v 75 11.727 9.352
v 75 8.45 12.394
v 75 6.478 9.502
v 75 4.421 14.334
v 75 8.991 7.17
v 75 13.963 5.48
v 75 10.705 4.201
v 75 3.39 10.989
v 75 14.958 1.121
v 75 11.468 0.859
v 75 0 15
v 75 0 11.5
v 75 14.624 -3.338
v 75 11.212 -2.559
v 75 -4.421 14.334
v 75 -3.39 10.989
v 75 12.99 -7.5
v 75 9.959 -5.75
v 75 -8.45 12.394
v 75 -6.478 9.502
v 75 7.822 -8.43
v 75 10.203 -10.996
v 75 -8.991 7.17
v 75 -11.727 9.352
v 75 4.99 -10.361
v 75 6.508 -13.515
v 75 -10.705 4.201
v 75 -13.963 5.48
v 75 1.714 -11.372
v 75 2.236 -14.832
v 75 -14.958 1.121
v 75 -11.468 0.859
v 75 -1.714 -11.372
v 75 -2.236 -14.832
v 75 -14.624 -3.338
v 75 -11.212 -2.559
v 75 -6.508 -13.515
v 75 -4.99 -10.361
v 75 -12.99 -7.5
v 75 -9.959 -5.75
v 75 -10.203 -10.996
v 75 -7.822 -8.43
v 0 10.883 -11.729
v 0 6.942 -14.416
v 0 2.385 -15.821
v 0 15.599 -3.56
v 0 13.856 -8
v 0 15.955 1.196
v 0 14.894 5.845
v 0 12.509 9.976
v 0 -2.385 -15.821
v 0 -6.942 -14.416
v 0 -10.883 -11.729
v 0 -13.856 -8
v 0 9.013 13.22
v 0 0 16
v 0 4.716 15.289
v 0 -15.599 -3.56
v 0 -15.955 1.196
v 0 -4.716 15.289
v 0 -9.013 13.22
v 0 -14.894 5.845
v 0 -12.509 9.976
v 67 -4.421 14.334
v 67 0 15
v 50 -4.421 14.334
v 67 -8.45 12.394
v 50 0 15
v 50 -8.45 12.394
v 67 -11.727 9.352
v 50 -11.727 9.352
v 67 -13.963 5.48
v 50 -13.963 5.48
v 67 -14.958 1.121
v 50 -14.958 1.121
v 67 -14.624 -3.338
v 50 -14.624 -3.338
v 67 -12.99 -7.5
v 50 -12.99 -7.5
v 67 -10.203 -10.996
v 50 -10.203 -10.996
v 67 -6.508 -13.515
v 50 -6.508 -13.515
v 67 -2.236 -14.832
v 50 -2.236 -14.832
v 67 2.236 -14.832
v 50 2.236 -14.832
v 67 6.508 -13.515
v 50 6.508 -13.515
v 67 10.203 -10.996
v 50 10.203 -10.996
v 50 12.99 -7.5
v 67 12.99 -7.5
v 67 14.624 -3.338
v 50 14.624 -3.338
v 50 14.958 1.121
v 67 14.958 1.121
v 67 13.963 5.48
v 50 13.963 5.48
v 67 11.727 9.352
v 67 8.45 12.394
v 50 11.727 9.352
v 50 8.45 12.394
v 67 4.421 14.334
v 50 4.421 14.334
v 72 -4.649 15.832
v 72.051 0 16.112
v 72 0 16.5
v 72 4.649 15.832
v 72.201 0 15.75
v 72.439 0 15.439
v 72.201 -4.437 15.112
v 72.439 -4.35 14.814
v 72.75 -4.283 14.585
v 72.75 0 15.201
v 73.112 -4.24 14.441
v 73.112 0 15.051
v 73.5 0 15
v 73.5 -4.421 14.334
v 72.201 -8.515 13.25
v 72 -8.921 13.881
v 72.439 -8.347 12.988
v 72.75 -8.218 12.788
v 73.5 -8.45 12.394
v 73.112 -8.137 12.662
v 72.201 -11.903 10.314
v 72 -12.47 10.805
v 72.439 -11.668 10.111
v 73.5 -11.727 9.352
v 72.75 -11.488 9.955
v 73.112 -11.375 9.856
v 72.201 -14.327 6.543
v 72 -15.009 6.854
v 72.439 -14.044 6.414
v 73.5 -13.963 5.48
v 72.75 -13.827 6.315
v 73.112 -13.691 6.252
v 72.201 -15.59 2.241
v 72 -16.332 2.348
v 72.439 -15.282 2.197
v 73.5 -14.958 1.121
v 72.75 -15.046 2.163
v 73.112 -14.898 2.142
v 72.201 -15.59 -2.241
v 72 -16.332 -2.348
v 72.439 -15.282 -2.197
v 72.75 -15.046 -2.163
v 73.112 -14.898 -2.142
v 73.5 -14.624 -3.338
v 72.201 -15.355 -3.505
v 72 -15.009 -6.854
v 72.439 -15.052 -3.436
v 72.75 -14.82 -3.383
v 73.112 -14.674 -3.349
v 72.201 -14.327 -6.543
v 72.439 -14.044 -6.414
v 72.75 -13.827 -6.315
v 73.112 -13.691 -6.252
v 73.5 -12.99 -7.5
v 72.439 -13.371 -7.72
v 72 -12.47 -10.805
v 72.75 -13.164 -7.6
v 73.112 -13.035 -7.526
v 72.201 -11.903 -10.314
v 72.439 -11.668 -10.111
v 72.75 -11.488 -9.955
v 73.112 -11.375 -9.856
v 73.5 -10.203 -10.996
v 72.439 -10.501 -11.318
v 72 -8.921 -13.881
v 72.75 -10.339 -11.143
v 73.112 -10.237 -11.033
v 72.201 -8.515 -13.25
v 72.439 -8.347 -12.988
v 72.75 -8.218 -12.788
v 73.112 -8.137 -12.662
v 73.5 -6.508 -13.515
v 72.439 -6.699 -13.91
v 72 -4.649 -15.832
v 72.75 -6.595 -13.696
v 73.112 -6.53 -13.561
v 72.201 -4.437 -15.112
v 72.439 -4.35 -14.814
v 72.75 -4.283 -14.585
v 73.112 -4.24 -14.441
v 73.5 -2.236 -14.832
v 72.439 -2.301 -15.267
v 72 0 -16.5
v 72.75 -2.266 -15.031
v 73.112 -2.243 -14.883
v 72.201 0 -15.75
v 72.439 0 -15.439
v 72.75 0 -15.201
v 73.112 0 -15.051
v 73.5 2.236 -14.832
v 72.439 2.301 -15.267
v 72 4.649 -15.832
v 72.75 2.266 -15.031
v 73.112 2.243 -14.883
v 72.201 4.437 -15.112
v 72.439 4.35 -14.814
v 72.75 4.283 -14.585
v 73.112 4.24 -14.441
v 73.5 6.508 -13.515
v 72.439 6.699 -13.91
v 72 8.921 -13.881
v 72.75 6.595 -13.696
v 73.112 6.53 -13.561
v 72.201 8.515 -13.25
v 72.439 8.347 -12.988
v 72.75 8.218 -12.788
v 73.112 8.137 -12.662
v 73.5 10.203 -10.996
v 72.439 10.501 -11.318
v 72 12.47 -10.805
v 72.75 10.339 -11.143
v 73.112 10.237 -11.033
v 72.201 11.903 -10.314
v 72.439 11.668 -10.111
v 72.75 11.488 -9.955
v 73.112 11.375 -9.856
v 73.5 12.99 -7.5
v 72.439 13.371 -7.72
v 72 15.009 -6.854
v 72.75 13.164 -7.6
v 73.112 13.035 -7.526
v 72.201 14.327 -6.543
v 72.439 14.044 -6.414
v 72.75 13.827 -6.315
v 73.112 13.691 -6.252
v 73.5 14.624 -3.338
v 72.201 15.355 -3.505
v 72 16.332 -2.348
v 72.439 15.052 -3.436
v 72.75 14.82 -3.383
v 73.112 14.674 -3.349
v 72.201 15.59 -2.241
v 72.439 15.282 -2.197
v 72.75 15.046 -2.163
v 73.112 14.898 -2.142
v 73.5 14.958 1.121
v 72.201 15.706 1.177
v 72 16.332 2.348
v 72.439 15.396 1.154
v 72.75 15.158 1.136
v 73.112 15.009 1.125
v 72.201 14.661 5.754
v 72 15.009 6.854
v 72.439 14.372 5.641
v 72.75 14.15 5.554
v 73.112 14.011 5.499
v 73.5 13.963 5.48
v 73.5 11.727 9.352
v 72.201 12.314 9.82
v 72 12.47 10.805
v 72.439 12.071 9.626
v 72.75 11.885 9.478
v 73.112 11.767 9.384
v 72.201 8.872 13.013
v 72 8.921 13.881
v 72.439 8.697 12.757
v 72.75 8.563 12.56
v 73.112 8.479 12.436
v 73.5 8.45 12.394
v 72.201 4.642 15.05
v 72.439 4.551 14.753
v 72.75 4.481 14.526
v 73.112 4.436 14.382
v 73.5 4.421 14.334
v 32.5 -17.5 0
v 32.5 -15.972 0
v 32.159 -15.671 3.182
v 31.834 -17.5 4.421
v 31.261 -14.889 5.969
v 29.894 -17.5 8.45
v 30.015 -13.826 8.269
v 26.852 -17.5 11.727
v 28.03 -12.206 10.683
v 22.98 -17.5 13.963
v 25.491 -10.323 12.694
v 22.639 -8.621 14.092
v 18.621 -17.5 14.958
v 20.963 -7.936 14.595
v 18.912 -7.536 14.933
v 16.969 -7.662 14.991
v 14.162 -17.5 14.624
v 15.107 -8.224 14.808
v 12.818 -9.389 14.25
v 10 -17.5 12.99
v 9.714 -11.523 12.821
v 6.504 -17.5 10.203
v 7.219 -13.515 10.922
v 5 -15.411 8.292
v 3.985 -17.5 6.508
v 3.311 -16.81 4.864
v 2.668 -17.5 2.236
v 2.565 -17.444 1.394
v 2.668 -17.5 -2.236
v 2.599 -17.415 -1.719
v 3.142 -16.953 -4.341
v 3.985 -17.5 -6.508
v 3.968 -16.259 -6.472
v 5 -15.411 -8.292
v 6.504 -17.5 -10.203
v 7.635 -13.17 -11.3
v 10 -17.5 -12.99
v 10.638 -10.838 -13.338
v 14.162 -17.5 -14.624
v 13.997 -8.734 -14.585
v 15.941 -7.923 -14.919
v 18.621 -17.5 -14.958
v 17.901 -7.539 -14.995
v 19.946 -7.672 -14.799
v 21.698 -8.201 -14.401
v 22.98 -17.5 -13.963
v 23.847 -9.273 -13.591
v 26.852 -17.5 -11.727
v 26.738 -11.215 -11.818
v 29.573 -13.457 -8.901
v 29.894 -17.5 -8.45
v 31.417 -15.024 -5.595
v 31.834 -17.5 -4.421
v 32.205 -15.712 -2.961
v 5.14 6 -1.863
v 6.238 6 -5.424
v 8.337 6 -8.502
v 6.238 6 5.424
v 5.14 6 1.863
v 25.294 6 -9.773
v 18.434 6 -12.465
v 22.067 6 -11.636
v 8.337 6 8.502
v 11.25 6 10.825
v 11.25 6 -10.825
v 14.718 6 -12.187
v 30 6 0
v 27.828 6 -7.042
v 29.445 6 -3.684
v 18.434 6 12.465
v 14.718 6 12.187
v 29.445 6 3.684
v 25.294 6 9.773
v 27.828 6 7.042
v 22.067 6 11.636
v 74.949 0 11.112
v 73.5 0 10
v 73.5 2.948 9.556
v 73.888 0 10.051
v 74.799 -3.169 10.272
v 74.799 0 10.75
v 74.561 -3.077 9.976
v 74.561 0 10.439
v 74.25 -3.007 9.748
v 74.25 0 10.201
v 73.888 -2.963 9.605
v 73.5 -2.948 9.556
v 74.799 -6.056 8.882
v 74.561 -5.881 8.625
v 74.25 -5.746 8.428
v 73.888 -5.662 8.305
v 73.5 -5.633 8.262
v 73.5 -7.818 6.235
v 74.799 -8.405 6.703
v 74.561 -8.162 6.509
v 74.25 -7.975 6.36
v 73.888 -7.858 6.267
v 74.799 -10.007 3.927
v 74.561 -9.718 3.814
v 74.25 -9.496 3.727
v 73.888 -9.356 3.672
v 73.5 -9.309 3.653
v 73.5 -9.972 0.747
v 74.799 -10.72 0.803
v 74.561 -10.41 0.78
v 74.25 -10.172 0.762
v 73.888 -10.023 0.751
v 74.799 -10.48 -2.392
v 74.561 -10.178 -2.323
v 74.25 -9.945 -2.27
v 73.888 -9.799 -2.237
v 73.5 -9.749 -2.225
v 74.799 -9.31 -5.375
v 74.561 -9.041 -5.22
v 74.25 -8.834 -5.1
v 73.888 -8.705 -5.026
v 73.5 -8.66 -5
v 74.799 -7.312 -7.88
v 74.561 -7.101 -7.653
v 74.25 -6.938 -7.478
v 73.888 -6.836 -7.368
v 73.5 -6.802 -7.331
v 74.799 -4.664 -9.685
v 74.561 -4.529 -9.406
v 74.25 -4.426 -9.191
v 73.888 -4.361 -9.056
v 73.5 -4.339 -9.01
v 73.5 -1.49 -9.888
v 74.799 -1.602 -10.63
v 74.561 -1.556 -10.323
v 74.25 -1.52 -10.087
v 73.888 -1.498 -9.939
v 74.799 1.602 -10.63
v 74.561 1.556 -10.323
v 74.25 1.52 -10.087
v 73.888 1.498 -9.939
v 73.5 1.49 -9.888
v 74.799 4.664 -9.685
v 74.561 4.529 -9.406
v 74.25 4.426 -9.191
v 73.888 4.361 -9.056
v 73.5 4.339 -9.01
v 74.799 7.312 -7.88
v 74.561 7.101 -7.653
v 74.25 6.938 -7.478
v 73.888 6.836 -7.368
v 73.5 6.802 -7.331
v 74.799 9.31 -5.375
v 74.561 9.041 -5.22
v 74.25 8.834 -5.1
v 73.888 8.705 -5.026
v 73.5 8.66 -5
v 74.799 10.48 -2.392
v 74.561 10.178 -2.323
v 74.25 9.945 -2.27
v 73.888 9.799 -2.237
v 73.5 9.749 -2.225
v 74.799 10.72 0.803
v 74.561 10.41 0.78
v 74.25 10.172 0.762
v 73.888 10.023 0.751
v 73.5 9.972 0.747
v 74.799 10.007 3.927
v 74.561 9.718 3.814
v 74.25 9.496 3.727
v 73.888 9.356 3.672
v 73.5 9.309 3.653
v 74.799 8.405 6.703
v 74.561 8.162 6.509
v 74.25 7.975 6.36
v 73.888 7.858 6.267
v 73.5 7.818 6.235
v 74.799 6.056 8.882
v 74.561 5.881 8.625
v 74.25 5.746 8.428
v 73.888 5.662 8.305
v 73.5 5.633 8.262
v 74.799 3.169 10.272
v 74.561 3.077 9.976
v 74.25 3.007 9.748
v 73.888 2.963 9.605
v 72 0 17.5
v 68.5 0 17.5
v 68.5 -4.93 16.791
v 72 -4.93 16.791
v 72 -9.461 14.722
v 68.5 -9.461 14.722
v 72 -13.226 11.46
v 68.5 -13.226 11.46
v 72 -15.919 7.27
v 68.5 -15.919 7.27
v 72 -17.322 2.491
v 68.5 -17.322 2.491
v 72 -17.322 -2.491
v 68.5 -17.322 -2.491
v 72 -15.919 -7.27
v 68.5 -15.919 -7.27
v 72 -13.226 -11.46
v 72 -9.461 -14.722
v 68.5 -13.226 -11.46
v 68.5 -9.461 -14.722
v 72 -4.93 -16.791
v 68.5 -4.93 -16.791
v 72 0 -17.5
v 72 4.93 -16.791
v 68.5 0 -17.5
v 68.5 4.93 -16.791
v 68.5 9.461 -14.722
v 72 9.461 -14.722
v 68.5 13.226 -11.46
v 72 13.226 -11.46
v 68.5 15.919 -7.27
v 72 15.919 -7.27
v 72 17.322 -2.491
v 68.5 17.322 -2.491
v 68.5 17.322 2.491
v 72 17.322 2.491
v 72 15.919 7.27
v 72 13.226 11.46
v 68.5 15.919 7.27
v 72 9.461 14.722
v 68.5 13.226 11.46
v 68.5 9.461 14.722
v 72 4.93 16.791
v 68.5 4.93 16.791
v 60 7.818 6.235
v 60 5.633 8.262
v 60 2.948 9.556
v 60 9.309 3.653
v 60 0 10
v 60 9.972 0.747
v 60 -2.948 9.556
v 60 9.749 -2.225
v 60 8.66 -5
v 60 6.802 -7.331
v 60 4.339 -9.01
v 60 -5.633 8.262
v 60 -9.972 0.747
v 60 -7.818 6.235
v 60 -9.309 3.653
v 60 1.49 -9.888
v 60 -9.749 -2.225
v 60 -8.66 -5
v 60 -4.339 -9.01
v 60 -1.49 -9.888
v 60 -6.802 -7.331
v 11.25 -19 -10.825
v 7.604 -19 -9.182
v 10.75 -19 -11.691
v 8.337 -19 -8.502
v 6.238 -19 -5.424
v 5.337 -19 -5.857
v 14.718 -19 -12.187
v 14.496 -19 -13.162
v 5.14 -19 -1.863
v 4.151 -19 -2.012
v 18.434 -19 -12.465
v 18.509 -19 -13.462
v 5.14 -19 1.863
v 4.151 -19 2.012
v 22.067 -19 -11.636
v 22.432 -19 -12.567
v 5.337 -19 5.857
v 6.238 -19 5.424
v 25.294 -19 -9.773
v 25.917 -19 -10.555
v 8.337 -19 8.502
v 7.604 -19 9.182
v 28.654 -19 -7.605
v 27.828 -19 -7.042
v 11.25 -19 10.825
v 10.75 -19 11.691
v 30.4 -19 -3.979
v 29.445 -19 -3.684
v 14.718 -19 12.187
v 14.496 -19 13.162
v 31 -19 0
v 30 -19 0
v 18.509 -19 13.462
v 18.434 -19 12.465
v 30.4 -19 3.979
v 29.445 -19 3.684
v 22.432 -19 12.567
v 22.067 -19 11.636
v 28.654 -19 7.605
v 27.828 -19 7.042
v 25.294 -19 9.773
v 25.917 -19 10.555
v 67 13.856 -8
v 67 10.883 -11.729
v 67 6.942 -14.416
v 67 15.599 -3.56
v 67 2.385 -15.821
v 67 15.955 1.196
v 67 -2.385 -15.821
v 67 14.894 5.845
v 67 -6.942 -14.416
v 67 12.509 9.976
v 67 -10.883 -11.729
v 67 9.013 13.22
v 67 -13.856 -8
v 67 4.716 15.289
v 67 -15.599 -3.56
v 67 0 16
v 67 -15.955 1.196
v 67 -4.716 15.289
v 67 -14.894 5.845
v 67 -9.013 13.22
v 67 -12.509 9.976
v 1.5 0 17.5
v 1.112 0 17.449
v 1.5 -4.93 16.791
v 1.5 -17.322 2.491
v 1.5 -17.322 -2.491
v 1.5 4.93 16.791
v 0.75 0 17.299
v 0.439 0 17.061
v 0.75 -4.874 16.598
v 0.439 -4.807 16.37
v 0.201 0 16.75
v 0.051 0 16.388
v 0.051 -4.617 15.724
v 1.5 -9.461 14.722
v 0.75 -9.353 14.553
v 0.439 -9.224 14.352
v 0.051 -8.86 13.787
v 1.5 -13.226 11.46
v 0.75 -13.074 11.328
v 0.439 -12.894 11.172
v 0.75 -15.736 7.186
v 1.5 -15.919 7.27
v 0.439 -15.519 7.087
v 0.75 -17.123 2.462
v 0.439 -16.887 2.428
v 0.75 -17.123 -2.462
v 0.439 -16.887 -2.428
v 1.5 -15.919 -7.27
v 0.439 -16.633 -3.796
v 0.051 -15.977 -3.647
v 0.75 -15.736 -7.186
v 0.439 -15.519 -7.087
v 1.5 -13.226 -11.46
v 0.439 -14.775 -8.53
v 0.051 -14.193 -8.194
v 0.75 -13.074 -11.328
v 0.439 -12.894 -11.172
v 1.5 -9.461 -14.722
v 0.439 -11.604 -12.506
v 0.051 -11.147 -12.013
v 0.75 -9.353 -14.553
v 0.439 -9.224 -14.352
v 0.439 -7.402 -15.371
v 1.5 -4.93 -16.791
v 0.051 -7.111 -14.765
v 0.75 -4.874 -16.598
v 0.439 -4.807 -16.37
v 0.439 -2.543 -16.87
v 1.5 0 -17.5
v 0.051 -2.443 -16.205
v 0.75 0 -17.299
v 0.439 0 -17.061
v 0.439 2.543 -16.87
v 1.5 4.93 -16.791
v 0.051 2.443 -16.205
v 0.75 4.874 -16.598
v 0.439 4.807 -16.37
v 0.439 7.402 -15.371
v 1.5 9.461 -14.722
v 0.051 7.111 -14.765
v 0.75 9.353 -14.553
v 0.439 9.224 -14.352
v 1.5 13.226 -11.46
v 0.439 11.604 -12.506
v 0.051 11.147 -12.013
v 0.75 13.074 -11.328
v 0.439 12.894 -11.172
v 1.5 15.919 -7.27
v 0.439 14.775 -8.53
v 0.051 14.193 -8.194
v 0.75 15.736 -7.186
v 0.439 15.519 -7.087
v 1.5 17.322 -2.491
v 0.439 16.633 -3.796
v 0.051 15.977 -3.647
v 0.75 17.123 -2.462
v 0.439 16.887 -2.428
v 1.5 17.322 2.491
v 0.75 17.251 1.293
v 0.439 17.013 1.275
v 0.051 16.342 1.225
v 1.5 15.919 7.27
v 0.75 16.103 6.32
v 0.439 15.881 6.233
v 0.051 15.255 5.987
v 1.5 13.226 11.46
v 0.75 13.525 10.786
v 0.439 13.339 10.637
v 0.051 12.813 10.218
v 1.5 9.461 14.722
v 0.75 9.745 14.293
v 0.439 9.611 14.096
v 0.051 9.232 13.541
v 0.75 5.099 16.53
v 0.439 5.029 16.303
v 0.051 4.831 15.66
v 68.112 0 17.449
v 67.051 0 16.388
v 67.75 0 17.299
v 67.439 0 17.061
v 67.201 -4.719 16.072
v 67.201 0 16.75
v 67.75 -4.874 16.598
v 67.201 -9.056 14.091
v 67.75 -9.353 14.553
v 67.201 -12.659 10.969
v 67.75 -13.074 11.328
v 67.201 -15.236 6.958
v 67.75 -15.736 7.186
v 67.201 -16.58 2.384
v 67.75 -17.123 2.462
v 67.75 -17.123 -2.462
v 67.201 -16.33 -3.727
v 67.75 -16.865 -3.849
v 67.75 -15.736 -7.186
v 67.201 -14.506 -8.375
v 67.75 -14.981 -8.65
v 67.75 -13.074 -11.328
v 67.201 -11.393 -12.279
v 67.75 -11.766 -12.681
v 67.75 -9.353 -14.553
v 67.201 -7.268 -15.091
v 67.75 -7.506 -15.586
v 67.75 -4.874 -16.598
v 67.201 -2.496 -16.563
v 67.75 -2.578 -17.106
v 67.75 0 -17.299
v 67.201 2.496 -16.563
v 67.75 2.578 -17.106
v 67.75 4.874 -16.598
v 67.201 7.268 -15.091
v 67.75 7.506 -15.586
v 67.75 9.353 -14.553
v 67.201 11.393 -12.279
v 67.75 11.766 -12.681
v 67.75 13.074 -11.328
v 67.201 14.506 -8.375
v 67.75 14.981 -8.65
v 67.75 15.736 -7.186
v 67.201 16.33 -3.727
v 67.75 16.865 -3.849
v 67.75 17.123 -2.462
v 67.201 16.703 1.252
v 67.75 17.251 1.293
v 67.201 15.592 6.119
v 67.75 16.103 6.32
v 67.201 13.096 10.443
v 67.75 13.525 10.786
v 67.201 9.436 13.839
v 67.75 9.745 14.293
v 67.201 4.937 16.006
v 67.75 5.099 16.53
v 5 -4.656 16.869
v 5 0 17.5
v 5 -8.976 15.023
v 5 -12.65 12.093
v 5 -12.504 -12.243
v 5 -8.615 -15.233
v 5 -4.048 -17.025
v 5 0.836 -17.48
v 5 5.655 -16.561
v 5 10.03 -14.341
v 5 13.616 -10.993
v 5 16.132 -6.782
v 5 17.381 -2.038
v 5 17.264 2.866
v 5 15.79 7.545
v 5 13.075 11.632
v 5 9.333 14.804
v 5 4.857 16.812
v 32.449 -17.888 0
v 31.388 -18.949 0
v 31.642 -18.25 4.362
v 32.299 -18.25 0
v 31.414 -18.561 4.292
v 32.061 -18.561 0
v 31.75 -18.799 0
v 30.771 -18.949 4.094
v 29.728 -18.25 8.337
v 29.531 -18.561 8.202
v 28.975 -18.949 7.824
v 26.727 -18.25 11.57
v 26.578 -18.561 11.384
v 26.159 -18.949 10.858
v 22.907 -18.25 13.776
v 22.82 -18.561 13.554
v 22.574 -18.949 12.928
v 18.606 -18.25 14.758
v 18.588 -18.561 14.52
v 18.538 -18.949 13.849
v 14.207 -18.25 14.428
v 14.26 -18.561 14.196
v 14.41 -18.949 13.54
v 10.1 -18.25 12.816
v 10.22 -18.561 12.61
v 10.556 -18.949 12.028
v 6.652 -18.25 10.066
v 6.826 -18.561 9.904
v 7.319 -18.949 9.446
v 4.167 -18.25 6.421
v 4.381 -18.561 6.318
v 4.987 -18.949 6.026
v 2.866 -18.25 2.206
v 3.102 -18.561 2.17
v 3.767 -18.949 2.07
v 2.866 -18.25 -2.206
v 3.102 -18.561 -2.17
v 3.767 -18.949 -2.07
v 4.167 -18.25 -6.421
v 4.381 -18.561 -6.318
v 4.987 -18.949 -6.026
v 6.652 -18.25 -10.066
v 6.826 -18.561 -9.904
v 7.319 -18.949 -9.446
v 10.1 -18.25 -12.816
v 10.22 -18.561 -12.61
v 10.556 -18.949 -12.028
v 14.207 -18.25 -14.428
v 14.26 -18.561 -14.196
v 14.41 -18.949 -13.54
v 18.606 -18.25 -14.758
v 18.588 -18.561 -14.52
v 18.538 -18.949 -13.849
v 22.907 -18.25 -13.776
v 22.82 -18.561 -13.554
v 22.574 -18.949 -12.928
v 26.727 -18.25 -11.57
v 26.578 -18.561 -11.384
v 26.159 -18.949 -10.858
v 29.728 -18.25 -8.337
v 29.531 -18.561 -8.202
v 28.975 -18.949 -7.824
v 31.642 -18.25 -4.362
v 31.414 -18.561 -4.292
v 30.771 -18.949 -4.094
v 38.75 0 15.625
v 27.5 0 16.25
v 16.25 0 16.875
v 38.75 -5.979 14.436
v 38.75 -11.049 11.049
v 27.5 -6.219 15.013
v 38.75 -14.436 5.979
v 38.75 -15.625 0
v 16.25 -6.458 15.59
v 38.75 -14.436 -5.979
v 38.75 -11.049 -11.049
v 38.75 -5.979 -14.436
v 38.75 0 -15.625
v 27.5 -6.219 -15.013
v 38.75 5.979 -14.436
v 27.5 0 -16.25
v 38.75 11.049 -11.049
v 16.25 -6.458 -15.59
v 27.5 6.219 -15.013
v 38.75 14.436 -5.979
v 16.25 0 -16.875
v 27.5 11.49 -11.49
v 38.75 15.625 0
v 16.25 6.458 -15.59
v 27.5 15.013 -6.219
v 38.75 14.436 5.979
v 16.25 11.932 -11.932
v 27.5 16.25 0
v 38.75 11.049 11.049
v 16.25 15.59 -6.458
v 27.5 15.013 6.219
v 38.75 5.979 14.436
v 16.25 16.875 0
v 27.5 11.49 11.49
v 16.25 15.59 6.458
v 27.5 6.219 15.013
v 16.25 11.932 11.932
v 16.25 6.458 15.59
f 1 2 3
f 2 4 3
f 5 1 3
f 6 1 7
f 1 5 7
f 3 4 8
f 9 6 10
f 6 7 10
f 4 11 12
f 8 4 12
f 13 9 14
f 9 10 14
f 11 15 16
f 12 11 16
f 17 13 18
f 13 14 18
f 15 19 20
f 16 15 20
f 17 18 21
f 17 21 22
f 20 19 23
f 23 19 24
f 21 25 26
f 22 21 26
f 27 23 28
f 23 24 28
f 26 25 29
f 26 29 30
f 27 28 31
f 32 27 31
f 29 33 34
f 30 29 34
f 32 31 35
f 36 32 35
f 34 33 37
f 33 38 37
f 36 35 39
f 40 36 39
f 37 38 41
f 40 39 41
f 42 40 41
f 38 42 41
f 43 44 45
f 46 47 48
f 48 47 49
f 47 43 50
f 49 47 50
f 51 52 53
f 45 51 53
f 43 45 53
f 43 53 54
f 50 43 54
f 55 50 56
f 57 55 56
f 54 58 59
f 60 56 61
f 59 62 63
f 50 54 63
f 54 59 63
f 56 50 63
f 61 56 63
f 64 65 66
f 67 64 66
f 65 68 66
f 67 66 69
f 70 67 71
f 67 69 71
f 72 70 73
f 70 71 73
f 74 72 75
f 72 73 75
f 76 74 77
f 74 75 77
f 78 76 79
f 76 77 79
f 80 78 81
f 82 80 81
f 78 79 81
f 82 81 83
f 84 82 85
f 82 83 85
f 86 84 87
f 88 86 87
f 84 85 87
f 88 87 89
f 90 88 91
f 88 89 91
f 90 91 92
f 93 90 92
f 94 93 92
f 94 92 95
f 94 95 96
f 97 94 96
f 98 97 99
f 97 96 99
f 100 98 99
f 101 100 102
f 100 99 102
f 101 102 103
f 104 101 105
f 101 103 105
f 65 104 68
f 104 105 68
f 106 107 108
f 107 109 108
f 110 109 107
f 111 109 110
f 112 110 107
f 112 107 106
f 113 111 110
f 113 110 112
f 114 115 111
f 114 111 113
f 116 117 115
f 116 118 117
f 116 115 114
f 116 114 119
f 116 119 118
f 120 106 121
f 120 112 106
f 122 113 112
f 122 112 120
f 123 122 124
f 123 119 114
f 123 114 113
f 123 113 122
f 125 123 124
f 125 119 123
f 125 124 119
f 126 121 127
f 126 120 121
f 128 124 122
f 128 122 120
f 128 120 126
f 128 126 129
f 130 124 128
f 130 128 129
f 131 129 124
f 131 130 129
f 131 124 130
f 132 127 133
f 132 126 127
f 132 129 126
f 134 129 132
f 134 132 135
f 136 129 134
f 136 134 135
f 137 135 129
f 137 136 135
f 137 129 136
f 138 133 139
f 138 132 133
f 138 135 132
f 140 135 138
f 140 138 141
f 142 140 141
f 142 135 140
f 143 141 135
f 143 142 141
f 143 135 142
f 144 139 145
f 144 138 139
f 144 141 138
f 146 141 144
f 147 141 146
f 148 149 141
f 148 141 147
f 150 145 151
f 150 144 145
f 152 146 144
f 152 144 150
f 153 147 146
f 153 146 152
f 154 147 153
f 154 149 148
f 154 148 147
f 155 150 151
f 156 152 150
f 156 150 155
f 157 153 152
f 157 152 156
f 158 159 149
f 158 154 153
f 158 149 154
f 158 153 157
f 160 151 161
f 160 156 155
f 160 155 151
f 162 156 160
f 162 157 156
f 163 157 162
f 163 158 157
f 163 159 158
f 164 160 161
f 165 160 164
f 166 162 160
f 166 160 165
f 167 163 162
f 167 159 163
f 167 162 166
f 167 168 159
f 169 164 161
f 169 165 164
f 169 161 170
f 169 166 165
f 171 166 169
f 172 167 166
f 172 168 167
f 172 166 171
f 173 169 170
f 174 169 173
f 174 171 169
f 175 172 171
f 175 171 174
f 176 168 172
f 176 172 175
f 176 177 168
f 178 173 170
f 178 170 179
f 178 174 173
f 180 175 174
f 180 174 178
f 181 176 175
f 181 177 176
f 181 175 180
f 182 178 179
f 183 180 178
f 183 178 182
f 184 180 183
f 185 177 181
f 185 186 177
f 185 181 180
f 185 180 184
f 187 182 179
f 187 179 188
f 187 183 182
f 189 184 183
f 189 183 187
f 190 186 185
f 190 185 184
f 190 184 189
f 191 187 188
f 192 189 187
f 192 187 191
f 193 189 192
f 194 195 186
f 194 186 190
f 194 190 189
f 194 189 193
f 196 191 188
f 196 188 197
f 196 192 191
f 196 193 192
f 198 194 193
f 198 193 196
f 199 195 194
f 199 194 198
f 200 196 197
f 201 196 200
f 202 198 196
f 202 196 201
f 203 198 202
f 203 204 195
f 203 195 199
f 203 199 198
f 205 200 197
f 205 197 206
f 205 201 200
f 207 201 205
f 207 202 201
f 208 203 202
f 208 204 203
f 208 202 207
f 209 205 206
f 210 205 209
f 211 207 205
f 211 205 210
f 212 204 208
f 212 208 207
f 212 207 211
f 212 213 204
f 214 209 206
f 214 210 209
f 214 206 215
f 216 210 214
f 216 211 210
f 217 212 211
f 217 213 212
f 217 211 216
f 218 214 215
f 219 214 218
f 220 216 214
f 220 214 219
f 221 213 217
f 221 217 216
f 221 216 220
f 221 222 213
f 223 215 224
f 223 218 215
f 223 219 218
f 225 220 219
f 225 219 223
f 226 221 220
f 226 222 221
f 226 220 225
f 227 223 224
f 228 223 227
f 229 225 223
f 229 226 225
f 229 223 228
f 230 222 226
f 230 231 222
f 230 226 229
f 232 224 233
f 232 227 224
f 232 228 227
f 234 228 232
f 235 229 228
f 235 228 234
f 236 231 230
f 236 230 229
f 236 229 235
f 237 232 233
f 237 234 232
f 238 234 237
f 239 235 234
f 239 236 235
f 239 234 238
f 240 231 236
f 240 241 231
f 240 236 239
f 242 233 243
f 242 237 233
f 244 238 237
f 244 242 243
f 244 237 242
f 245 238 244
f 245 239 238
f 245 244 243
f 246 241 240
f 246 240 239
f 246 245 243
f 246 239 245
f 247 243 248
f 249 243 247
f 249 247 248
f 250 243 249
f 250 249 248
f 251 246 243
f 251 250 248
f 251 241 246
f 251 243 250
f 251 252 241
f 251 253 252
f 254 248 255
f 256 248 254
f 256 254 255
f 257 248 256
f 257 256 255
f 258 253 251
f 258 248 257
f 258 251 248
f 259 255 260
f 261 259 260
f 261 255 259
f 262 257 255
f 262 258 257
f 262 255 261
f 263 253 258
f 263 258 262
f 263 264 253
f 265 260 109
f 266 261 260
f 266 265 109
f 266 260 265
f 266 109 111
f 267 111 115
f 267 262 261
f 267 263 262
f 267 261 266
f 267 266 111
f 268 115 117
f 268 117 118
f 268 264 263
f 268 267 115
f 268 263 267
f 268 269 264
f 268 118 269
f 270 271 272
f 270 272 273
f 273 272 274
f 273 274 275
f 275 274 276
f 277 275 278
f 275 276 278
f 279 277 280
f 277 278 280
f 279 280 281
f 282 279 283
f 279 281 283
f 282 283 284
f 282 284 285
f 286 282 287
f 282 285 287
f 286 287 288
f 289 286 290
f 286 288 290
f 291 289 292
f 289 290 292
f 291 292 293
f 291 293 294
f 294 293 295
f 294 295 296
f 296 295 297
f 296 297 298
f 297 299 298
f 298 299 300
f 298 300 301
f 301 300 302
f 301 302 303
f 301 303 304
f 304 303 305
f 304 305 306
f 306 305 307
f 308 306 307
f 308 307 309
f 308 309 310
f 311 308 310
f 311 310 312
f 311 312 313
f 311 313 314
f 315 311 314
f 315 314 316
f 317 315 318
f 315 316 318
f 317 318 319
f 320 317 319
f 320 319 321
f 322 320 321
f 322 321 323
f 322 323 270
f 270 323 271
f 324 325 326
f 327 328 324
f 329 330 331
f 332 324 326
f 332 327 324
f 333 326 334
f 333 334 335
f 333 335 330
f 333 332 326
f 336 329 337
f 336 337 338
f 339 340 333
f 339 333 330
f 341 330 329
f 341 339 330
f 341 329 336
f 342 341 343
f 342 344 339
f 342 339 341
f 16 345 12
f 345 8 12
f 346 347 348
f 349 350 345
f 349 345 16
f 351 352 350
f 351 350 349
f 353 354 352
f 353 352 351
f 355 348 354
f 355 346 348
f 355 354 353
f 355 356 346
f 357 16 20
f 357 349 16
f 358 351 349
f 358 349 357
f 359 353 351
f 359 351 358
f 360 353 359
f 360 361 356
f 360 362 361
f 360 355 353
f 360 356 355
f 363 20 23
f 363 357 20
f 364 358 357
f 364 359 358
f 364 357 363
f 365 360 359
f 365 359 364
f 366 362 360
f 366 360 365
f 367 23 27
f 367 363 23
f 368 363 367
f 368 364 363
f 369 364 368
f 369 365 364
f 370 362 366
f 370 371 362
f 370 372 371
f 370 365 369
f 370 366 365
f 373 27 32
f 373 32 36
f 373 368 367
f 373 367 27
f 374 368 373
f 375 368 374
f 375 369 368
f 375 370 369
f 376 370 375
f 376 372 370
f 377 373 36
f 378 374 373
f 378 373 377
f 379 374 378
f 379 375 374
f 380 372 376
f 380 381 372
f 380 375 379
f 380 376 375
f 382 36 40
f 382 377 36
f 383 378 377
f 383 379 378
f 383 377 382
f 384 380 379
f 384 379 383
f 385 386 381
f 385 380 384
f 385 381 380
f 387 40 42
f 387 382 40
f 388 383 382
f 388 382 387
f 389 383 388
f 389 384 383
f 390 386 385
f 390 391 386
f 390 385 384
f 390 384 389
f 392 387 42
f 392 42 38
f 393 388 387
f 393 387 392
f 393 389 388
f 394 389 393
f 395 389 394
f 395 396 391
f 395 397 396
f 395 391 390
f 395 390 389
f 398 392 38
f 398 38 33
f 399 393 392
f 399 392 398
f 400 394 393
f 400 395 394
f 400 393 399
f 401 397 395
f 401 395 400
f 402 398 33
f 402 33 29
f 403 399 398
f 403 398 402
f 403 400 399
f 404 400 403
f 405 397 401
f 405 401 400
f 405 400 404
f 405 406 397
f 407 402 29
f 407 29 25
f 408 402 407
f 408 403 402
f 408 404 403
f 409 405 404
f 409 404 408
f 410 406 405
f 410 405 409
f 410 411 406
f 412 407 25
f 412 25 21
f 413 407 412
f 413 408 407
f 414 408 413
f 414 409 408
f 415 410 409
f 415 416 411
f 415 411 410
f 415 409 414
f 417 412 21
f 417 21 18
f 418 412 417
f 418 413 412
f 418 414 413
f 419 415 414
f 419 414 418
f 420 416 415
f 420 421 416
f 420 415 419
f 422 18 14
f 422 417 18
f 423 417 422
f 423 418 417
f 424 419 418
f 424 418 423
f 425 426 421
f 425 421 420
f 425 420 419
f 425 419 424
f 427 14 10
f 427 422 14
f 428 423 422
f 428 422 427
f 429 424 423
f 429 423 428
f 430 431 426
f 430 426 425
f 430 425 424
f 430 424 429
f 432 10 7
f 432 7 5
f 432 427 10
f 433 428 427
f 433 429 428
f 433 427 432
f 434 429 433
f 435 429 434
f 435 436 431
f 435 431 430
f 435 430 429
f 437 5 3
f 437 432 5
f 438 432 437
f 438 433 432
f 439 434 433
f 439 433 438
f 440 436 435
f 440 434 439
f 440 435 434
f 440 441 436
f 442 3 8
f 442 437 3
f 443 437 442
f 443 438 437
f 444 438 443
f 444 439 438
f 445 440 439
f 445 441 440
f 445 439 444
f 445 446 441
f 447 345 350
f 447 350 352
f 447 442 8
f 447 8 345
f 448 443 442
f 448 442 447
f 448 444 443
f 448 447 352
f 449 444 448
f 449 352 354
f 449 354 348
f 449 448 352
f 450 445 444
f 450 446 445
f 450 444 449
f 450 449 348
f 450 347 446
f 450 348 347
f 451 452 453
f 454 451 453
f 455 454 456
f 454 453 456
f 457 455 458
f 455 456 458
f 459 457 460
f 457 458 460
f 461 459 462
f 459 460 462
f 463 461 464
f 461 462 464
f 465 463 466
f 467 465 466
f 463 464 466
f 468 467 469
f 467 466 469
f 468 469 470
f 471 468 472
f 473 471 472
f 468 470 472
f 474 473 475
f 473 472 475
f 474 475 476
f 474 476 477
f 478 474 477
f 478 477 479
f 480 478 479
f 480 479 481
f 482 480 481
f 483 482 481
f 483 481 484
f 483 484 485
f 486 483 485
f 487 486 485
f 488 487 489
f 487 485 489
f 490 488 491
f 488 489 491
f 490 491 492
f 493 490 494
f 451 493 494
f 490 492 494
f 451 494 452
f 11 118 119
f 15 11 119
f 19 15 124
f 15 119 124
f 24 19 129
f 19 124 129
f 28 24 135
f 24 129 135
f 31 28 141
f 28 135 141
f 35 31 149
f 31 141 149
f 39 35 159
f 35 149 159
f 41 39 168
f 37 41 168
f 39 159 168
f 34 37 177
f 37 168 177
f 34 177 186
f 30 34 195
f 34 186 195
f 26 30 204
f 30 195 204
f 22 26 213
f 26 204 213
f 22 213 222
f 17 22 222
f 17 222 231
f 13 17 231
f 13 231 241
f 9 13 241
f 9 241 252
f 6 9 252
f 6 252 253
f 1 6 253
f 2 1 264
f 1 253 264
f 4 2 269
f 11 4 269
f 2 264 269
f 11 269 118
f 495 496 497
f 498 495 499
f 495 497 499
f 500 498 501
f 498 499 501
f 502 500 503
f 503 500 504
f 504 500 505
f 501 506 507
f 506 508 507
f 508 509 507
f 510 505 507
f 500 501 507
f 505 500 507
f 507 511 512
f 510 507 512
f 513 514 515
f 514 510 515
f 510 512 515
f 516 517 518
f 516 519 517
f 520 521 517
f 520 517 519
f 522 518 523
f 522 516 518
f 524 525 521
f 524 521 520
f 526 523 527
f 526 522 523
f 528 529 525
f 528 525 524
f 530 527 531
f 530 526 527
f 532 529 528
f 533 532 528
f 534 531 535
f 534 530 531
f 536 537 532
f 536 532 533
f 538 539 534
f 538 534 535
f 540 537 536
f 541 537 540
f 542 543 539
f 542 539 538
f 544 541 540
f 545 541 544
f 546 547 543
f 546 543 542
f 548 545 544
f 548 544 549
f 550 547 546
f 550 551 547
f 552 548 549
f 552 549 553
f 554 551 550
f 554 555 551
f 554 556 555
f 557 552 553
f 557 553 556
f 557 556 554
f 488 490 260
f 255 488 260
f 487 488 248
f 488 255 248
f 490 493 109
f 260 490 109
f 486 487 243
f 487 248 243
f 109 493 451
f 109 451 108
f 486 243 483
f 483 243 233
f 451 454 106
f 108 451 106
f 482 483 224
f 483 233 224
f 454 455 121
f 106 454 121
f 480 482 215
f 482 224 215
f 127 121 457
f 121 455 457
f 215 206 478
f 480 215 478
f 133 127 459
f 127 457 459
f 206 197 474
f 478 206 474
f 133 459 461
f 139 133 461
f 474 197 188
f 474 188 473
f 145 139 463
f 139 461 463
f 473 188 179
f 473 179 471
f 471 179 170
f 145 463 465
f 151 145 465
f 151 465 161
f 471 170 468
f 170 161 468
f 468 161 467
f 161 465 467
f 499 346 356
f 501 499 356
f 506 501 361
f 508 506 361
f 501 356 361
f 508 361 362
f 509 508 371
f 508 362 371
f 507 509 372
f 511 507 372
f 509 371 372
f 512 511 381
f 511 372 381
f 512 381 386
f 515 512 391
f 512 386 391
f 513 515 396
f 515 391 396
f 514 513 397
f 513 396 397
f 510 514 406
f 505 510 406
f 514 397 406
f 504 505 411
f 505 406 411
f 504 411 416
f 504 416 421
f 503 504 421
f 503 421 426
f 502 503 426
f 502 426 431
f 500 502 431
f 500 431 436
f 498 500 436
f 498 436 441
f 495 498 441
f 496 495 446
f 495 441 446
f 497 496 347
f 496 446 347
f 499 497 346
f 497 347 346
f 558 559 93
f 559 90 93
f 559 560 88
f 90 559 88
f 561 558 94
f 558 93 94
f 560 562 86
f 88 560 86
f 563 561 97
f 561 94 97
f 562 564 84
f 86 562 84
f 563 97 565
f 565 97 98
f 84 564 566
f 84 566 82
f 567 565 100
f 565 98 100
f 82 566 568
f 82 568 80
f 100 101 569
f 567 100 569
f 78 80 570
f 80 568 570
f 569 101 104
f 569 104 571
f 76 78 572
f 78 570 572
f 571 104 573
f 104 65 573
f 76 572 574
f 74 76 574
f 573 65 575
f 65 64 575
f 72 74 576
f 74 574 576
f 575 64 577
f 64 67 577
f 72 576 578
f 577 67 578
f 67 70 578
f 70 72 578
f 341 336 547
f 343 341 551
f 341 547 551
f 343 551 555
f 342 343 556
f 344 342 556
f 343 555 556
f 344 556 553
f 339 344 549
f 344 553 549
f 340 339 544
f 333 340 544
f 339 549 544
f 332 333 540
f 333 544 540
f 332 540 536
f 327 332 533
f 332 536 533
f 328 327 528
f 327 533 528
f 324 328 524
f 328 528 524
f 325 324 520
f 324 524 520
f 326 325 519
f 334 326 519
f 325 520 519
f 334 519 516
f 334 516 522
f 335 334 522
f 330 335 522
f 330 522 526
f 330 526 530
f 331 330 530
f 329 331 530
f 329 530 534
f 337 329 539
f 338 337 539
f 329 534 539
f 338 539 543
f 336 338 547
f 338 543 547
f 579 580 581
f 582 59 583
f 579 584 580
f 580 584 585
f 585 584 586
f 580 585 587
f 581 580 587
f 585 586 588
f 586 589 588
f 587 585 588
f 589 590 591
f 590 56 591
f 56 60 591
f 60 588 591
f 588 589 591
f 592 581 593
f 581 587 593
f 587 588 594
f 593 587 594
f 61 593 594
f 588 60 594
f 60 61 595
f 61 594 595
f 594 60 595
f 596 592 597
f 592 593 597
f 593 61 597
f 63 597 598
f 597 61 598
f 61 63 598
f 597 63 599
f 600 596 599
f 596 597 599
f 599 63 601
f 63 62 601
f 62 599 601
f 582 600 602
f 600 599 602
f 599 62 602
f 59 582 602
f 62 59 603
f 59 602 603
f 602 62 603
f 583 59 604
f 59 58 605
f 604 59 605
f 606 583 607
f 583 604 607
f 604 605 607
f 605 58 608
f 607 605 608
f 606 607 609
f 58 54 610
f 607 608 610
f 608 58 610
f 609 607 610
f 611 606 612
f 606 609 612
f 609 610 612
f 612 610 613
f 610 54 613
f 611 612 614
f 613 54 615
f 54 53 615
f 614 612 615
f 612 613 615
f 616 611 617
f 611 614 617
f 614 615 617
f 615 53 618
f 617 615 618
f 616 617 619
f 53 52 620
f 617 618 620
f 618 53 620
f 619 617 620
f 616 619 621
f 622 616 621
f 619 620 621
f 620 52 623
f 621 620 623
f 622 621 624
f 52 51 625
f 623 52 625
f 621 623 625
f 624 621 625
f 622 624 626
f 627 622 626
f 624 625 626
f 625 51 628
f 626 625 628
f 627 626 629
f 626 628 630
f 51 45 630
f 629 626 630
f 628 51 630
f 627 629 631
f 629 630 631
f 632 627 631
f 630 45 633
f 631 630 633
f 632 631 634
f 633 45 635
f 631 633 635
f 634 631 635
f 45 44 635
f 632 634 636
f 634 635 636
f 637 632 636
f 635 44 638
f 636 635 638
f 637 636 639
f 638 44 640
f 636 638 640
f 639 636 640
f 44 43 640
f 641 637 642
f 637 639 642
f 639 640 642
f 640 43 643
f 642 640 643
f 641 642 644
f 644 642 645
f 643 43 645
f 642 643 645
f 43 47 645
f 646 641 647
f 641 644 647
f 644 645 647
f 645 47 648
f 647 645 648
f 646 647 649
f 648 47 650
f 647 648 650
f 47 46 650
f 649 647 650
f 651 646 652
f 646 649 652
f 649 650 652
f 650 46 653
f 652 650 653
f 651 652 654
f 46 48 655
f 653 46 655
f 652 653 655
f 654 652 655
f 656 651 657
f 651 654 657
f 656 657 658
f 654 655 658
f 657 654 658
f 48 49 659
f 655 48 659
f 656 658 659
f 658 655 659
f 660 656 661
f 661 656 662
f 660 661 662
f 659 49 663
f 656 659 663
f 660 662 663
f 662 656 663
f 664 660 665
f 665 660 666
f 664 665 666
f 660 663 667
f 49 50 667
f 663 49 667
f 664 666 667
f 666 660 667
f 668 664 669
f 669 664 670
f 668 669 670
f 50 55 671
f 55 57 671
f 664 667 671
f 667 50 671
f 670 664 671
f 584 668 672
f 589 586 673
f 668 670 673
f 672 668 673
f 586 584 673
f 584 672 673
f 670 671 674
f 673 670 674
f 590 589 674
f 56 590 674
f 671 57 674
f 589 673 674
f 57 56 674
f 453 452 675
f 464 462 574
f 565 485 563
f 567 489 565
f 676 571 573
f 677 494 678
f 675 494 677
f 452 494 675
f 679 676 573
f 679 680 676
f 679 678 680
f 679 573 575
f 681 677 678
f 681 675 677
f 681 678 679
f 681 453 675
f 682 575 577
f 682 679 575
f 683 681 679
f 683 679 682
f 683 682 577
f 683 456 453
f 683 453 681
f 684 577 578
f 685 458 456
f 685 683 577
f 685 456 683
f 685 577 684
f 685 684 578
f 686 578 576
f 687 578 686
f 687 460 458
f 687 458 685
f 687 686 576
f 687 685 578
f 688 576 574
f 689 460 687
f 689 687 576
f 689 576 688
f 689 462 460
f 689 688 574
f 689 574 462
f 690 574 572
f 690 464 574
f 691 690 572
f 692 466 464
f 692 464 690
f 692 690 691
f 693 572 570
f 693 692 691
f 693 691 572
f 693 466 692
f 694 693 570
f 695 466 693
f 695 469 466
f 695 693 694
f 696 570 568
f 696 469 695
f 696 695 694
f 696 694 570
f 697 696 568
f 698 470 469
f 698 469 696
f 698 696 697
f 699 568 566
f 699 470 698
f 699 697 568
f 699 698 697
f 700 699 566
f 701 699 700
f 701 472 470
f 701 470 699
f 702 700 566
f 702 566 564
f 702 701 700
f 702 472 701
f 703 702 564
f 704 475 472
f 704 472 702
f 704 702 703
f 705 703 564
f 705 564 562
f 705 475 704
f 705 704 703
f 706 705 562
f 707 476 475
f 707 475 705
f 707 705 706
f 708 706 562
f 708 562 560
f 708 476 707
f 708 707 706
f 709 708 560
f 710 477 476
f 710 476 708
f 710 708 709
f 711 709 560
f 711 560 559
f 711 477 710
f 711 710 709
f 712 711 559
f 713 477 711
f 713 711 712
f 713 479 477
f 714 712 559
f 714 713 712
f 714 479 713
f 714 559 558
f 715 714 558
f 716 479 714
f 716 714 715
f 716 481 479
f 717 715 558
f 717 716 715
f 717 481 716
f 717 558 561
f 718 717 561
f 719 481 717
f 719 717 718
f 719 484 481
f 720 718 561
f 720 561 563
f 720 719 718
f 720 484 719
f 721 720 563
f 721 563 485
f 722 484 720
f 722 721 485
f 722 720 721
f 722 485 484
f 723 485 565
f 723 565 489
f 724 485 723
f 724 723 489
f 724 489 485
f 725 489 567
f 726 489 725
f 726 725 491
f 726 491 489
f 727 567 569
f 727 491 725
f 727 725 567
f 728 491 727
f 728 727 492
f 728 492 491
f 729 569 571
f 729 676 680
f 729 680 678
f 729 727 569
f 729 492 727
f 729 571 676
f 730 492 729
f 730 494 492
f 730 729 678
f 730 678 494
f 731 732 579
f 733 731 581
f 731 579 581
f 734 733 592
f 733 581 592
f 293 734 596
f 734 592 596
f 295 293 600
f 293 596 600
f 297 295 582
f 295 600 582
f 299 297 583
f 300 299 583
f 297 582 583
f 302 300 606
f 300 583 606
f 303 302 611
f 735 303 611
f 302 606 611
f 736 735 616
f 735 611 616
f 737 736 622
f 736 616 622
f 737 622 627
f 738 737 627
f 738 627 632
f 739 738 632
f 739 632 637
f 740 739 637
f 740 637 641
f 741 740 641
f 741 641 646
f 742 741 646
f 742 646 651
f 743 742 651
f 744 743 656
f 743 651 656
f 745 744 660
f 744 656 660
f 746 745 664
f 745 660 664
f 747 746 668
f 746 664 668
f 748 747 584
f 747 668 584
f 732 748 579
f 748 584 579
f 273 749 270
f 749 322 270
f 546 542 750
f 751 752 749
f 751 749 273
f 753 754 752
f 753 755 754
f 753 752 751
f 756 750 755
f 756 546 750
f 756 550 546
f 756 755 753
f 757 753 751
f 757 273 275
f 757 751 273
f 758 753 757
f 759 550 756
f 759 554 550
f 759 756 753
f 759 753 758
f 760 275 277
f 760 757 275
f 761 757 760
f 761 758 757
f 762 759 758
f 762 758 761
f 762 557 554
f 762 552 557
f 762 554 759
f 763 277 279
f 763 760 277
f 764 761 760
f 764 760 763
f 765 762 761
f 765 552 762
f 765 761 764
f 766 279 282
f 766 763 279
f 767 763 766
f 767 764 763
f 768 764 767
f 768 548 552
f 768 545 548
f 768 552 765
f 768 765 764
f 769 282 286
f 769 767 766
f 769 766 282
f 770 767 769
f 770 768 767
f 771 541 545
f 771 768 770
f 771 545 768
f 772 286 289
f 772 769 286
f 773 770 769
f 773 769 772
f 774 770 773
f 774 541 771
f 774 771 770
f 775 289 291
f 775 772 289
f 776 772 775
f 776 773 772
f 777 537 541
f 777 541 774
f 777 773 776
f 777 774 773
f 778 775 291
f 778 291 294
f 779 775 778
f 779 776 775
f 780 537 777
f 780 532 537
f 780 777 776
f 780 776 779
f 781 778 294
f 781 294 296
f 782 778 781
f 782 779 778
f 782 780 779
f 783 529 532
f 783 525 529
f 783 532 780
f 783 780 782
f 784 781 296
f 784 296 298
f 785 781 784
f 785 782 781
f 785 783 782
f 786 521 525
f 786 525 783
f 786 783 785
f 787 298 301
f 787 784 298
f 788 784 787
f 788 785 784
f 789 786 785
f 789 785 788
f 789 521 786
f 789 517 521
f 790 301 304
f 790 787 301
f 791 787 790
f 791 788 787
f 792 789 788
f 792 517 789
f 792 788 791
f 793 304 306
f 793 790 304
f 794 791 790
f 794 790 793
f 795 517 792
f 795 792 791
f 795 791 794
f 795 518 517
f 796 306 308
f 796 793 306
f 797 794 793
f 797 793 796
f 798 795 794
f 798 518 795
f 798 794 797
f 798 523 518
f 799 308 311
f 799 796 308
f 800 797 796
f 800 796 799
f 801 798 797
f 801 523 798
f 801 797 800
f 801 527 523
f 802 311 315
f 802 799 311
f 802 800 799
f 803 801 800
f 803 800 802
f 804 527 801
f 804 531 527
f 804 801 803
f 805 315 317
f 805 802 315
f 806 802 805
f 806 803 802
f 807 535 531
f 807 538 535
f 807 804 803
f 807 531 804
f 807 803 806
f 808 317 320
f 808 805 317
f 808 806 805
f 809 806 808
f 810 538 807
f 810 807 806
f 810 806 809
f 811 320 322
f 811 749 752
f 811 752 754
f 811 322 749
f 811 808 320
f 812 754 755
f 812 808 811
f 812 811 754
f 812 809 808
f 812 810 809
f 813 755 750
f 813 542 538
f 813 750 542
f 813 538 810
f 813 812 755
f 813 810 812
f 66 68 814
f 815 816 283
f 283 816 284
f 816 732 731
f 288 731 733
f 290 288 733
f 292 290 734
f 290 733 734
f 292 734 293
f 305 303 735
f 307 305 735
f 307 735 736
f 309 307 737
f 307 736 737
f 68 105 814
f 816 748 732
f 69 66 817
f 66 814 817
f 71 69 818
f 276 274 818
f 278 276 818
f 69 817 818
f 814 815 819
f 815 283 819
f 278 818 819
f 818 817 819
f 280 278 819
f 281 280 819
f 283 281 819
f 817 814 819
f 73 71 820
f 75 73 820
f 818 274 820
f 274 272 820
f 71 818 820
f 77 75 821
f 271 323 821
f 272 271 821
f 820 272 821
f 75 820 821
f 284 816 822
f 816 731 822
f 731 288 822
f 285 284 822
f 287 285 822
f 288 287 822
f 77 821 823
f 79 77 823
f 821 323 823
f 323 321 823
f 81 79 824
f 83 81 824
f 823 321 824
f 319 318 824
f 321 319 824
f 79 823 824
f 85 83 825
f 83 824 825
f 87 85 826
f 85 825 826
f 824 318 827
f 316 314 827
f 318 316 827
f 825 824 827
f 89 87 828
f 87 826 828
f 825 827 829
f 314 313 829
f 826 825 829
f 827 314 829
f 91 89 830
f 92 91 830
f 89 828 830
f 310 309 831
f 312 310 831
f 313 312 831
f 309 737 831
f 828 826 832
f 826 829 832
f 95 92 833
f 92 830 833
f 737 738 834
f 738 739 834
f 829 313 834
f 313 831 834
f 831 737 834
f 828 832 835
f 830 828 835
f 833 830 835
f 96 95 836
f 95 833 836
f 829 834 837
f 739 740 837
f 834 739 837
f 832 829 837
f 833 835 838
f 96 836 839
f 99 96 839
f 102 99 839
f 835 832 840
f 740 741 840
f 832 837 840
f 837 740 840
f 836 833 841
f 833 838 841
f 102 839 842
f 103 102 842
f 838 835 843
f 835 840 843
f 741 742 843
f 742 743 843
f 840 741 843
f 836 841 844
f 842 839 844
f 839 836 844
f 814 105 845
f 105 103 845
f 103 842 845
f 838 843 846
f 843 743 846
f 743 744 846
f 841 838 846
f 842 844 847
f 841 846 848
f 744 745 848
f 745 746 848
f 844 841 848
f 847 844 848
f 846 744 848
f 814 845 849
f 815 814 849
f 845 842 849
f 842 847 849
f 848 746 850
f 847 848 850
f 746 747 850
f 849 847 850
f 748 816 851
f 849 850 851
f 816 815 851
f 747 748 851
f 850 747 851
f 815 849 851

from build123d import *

# Parameters (mm, degrees)
F2_R     = 15
F3_DEPTH = 19
F4_R     = 12.5
F5_DEPTH = 25
F6_R     = 1.5


with BuildPart() as f1:
    # F0 (on Front) → F1 (revolve)
    with BuildSketch(Plane.XZ):
        Polygon((0, 17.5), (0, 0), (60, 0), (60, 10), (75, 10), (75, 15), (72, 15), (72, 17.5), (67, 17.5), (67, 15), (50, 15), (5, 17.5), align=None)
    revolve(axis=Axis((30, 0, 0), (1, 0, 0)))

    # F2 (on Front) → F3 (join)
    with BuildSketch(Plane.XZ):
        with Locations((17.5, 0)):
            Circle(F2_R)
    extrude(amount=F3_DEPTH)

    # F4 (on face) → F5 (cut)
    with BuildSketch(Plane.XZ.offset(19)):
        with Locations((17.5, 0)):
            Circle(F4_R)
    extrude(amount=-F5_DEPTH, mode=Mode.SUBTRACT)

    # F6
    f6_edges = [f1.edges().sort_by_distance(p)[0] for p in [
        (2.5, -19, 0),
        (0, 0, -17.5),
        (67, 0, -17.5),
        (75, 0, -10),
        (72, 0, -15),
    ]]
    fillet(f6_edges, radius=F6_R)


solid = f1.part
